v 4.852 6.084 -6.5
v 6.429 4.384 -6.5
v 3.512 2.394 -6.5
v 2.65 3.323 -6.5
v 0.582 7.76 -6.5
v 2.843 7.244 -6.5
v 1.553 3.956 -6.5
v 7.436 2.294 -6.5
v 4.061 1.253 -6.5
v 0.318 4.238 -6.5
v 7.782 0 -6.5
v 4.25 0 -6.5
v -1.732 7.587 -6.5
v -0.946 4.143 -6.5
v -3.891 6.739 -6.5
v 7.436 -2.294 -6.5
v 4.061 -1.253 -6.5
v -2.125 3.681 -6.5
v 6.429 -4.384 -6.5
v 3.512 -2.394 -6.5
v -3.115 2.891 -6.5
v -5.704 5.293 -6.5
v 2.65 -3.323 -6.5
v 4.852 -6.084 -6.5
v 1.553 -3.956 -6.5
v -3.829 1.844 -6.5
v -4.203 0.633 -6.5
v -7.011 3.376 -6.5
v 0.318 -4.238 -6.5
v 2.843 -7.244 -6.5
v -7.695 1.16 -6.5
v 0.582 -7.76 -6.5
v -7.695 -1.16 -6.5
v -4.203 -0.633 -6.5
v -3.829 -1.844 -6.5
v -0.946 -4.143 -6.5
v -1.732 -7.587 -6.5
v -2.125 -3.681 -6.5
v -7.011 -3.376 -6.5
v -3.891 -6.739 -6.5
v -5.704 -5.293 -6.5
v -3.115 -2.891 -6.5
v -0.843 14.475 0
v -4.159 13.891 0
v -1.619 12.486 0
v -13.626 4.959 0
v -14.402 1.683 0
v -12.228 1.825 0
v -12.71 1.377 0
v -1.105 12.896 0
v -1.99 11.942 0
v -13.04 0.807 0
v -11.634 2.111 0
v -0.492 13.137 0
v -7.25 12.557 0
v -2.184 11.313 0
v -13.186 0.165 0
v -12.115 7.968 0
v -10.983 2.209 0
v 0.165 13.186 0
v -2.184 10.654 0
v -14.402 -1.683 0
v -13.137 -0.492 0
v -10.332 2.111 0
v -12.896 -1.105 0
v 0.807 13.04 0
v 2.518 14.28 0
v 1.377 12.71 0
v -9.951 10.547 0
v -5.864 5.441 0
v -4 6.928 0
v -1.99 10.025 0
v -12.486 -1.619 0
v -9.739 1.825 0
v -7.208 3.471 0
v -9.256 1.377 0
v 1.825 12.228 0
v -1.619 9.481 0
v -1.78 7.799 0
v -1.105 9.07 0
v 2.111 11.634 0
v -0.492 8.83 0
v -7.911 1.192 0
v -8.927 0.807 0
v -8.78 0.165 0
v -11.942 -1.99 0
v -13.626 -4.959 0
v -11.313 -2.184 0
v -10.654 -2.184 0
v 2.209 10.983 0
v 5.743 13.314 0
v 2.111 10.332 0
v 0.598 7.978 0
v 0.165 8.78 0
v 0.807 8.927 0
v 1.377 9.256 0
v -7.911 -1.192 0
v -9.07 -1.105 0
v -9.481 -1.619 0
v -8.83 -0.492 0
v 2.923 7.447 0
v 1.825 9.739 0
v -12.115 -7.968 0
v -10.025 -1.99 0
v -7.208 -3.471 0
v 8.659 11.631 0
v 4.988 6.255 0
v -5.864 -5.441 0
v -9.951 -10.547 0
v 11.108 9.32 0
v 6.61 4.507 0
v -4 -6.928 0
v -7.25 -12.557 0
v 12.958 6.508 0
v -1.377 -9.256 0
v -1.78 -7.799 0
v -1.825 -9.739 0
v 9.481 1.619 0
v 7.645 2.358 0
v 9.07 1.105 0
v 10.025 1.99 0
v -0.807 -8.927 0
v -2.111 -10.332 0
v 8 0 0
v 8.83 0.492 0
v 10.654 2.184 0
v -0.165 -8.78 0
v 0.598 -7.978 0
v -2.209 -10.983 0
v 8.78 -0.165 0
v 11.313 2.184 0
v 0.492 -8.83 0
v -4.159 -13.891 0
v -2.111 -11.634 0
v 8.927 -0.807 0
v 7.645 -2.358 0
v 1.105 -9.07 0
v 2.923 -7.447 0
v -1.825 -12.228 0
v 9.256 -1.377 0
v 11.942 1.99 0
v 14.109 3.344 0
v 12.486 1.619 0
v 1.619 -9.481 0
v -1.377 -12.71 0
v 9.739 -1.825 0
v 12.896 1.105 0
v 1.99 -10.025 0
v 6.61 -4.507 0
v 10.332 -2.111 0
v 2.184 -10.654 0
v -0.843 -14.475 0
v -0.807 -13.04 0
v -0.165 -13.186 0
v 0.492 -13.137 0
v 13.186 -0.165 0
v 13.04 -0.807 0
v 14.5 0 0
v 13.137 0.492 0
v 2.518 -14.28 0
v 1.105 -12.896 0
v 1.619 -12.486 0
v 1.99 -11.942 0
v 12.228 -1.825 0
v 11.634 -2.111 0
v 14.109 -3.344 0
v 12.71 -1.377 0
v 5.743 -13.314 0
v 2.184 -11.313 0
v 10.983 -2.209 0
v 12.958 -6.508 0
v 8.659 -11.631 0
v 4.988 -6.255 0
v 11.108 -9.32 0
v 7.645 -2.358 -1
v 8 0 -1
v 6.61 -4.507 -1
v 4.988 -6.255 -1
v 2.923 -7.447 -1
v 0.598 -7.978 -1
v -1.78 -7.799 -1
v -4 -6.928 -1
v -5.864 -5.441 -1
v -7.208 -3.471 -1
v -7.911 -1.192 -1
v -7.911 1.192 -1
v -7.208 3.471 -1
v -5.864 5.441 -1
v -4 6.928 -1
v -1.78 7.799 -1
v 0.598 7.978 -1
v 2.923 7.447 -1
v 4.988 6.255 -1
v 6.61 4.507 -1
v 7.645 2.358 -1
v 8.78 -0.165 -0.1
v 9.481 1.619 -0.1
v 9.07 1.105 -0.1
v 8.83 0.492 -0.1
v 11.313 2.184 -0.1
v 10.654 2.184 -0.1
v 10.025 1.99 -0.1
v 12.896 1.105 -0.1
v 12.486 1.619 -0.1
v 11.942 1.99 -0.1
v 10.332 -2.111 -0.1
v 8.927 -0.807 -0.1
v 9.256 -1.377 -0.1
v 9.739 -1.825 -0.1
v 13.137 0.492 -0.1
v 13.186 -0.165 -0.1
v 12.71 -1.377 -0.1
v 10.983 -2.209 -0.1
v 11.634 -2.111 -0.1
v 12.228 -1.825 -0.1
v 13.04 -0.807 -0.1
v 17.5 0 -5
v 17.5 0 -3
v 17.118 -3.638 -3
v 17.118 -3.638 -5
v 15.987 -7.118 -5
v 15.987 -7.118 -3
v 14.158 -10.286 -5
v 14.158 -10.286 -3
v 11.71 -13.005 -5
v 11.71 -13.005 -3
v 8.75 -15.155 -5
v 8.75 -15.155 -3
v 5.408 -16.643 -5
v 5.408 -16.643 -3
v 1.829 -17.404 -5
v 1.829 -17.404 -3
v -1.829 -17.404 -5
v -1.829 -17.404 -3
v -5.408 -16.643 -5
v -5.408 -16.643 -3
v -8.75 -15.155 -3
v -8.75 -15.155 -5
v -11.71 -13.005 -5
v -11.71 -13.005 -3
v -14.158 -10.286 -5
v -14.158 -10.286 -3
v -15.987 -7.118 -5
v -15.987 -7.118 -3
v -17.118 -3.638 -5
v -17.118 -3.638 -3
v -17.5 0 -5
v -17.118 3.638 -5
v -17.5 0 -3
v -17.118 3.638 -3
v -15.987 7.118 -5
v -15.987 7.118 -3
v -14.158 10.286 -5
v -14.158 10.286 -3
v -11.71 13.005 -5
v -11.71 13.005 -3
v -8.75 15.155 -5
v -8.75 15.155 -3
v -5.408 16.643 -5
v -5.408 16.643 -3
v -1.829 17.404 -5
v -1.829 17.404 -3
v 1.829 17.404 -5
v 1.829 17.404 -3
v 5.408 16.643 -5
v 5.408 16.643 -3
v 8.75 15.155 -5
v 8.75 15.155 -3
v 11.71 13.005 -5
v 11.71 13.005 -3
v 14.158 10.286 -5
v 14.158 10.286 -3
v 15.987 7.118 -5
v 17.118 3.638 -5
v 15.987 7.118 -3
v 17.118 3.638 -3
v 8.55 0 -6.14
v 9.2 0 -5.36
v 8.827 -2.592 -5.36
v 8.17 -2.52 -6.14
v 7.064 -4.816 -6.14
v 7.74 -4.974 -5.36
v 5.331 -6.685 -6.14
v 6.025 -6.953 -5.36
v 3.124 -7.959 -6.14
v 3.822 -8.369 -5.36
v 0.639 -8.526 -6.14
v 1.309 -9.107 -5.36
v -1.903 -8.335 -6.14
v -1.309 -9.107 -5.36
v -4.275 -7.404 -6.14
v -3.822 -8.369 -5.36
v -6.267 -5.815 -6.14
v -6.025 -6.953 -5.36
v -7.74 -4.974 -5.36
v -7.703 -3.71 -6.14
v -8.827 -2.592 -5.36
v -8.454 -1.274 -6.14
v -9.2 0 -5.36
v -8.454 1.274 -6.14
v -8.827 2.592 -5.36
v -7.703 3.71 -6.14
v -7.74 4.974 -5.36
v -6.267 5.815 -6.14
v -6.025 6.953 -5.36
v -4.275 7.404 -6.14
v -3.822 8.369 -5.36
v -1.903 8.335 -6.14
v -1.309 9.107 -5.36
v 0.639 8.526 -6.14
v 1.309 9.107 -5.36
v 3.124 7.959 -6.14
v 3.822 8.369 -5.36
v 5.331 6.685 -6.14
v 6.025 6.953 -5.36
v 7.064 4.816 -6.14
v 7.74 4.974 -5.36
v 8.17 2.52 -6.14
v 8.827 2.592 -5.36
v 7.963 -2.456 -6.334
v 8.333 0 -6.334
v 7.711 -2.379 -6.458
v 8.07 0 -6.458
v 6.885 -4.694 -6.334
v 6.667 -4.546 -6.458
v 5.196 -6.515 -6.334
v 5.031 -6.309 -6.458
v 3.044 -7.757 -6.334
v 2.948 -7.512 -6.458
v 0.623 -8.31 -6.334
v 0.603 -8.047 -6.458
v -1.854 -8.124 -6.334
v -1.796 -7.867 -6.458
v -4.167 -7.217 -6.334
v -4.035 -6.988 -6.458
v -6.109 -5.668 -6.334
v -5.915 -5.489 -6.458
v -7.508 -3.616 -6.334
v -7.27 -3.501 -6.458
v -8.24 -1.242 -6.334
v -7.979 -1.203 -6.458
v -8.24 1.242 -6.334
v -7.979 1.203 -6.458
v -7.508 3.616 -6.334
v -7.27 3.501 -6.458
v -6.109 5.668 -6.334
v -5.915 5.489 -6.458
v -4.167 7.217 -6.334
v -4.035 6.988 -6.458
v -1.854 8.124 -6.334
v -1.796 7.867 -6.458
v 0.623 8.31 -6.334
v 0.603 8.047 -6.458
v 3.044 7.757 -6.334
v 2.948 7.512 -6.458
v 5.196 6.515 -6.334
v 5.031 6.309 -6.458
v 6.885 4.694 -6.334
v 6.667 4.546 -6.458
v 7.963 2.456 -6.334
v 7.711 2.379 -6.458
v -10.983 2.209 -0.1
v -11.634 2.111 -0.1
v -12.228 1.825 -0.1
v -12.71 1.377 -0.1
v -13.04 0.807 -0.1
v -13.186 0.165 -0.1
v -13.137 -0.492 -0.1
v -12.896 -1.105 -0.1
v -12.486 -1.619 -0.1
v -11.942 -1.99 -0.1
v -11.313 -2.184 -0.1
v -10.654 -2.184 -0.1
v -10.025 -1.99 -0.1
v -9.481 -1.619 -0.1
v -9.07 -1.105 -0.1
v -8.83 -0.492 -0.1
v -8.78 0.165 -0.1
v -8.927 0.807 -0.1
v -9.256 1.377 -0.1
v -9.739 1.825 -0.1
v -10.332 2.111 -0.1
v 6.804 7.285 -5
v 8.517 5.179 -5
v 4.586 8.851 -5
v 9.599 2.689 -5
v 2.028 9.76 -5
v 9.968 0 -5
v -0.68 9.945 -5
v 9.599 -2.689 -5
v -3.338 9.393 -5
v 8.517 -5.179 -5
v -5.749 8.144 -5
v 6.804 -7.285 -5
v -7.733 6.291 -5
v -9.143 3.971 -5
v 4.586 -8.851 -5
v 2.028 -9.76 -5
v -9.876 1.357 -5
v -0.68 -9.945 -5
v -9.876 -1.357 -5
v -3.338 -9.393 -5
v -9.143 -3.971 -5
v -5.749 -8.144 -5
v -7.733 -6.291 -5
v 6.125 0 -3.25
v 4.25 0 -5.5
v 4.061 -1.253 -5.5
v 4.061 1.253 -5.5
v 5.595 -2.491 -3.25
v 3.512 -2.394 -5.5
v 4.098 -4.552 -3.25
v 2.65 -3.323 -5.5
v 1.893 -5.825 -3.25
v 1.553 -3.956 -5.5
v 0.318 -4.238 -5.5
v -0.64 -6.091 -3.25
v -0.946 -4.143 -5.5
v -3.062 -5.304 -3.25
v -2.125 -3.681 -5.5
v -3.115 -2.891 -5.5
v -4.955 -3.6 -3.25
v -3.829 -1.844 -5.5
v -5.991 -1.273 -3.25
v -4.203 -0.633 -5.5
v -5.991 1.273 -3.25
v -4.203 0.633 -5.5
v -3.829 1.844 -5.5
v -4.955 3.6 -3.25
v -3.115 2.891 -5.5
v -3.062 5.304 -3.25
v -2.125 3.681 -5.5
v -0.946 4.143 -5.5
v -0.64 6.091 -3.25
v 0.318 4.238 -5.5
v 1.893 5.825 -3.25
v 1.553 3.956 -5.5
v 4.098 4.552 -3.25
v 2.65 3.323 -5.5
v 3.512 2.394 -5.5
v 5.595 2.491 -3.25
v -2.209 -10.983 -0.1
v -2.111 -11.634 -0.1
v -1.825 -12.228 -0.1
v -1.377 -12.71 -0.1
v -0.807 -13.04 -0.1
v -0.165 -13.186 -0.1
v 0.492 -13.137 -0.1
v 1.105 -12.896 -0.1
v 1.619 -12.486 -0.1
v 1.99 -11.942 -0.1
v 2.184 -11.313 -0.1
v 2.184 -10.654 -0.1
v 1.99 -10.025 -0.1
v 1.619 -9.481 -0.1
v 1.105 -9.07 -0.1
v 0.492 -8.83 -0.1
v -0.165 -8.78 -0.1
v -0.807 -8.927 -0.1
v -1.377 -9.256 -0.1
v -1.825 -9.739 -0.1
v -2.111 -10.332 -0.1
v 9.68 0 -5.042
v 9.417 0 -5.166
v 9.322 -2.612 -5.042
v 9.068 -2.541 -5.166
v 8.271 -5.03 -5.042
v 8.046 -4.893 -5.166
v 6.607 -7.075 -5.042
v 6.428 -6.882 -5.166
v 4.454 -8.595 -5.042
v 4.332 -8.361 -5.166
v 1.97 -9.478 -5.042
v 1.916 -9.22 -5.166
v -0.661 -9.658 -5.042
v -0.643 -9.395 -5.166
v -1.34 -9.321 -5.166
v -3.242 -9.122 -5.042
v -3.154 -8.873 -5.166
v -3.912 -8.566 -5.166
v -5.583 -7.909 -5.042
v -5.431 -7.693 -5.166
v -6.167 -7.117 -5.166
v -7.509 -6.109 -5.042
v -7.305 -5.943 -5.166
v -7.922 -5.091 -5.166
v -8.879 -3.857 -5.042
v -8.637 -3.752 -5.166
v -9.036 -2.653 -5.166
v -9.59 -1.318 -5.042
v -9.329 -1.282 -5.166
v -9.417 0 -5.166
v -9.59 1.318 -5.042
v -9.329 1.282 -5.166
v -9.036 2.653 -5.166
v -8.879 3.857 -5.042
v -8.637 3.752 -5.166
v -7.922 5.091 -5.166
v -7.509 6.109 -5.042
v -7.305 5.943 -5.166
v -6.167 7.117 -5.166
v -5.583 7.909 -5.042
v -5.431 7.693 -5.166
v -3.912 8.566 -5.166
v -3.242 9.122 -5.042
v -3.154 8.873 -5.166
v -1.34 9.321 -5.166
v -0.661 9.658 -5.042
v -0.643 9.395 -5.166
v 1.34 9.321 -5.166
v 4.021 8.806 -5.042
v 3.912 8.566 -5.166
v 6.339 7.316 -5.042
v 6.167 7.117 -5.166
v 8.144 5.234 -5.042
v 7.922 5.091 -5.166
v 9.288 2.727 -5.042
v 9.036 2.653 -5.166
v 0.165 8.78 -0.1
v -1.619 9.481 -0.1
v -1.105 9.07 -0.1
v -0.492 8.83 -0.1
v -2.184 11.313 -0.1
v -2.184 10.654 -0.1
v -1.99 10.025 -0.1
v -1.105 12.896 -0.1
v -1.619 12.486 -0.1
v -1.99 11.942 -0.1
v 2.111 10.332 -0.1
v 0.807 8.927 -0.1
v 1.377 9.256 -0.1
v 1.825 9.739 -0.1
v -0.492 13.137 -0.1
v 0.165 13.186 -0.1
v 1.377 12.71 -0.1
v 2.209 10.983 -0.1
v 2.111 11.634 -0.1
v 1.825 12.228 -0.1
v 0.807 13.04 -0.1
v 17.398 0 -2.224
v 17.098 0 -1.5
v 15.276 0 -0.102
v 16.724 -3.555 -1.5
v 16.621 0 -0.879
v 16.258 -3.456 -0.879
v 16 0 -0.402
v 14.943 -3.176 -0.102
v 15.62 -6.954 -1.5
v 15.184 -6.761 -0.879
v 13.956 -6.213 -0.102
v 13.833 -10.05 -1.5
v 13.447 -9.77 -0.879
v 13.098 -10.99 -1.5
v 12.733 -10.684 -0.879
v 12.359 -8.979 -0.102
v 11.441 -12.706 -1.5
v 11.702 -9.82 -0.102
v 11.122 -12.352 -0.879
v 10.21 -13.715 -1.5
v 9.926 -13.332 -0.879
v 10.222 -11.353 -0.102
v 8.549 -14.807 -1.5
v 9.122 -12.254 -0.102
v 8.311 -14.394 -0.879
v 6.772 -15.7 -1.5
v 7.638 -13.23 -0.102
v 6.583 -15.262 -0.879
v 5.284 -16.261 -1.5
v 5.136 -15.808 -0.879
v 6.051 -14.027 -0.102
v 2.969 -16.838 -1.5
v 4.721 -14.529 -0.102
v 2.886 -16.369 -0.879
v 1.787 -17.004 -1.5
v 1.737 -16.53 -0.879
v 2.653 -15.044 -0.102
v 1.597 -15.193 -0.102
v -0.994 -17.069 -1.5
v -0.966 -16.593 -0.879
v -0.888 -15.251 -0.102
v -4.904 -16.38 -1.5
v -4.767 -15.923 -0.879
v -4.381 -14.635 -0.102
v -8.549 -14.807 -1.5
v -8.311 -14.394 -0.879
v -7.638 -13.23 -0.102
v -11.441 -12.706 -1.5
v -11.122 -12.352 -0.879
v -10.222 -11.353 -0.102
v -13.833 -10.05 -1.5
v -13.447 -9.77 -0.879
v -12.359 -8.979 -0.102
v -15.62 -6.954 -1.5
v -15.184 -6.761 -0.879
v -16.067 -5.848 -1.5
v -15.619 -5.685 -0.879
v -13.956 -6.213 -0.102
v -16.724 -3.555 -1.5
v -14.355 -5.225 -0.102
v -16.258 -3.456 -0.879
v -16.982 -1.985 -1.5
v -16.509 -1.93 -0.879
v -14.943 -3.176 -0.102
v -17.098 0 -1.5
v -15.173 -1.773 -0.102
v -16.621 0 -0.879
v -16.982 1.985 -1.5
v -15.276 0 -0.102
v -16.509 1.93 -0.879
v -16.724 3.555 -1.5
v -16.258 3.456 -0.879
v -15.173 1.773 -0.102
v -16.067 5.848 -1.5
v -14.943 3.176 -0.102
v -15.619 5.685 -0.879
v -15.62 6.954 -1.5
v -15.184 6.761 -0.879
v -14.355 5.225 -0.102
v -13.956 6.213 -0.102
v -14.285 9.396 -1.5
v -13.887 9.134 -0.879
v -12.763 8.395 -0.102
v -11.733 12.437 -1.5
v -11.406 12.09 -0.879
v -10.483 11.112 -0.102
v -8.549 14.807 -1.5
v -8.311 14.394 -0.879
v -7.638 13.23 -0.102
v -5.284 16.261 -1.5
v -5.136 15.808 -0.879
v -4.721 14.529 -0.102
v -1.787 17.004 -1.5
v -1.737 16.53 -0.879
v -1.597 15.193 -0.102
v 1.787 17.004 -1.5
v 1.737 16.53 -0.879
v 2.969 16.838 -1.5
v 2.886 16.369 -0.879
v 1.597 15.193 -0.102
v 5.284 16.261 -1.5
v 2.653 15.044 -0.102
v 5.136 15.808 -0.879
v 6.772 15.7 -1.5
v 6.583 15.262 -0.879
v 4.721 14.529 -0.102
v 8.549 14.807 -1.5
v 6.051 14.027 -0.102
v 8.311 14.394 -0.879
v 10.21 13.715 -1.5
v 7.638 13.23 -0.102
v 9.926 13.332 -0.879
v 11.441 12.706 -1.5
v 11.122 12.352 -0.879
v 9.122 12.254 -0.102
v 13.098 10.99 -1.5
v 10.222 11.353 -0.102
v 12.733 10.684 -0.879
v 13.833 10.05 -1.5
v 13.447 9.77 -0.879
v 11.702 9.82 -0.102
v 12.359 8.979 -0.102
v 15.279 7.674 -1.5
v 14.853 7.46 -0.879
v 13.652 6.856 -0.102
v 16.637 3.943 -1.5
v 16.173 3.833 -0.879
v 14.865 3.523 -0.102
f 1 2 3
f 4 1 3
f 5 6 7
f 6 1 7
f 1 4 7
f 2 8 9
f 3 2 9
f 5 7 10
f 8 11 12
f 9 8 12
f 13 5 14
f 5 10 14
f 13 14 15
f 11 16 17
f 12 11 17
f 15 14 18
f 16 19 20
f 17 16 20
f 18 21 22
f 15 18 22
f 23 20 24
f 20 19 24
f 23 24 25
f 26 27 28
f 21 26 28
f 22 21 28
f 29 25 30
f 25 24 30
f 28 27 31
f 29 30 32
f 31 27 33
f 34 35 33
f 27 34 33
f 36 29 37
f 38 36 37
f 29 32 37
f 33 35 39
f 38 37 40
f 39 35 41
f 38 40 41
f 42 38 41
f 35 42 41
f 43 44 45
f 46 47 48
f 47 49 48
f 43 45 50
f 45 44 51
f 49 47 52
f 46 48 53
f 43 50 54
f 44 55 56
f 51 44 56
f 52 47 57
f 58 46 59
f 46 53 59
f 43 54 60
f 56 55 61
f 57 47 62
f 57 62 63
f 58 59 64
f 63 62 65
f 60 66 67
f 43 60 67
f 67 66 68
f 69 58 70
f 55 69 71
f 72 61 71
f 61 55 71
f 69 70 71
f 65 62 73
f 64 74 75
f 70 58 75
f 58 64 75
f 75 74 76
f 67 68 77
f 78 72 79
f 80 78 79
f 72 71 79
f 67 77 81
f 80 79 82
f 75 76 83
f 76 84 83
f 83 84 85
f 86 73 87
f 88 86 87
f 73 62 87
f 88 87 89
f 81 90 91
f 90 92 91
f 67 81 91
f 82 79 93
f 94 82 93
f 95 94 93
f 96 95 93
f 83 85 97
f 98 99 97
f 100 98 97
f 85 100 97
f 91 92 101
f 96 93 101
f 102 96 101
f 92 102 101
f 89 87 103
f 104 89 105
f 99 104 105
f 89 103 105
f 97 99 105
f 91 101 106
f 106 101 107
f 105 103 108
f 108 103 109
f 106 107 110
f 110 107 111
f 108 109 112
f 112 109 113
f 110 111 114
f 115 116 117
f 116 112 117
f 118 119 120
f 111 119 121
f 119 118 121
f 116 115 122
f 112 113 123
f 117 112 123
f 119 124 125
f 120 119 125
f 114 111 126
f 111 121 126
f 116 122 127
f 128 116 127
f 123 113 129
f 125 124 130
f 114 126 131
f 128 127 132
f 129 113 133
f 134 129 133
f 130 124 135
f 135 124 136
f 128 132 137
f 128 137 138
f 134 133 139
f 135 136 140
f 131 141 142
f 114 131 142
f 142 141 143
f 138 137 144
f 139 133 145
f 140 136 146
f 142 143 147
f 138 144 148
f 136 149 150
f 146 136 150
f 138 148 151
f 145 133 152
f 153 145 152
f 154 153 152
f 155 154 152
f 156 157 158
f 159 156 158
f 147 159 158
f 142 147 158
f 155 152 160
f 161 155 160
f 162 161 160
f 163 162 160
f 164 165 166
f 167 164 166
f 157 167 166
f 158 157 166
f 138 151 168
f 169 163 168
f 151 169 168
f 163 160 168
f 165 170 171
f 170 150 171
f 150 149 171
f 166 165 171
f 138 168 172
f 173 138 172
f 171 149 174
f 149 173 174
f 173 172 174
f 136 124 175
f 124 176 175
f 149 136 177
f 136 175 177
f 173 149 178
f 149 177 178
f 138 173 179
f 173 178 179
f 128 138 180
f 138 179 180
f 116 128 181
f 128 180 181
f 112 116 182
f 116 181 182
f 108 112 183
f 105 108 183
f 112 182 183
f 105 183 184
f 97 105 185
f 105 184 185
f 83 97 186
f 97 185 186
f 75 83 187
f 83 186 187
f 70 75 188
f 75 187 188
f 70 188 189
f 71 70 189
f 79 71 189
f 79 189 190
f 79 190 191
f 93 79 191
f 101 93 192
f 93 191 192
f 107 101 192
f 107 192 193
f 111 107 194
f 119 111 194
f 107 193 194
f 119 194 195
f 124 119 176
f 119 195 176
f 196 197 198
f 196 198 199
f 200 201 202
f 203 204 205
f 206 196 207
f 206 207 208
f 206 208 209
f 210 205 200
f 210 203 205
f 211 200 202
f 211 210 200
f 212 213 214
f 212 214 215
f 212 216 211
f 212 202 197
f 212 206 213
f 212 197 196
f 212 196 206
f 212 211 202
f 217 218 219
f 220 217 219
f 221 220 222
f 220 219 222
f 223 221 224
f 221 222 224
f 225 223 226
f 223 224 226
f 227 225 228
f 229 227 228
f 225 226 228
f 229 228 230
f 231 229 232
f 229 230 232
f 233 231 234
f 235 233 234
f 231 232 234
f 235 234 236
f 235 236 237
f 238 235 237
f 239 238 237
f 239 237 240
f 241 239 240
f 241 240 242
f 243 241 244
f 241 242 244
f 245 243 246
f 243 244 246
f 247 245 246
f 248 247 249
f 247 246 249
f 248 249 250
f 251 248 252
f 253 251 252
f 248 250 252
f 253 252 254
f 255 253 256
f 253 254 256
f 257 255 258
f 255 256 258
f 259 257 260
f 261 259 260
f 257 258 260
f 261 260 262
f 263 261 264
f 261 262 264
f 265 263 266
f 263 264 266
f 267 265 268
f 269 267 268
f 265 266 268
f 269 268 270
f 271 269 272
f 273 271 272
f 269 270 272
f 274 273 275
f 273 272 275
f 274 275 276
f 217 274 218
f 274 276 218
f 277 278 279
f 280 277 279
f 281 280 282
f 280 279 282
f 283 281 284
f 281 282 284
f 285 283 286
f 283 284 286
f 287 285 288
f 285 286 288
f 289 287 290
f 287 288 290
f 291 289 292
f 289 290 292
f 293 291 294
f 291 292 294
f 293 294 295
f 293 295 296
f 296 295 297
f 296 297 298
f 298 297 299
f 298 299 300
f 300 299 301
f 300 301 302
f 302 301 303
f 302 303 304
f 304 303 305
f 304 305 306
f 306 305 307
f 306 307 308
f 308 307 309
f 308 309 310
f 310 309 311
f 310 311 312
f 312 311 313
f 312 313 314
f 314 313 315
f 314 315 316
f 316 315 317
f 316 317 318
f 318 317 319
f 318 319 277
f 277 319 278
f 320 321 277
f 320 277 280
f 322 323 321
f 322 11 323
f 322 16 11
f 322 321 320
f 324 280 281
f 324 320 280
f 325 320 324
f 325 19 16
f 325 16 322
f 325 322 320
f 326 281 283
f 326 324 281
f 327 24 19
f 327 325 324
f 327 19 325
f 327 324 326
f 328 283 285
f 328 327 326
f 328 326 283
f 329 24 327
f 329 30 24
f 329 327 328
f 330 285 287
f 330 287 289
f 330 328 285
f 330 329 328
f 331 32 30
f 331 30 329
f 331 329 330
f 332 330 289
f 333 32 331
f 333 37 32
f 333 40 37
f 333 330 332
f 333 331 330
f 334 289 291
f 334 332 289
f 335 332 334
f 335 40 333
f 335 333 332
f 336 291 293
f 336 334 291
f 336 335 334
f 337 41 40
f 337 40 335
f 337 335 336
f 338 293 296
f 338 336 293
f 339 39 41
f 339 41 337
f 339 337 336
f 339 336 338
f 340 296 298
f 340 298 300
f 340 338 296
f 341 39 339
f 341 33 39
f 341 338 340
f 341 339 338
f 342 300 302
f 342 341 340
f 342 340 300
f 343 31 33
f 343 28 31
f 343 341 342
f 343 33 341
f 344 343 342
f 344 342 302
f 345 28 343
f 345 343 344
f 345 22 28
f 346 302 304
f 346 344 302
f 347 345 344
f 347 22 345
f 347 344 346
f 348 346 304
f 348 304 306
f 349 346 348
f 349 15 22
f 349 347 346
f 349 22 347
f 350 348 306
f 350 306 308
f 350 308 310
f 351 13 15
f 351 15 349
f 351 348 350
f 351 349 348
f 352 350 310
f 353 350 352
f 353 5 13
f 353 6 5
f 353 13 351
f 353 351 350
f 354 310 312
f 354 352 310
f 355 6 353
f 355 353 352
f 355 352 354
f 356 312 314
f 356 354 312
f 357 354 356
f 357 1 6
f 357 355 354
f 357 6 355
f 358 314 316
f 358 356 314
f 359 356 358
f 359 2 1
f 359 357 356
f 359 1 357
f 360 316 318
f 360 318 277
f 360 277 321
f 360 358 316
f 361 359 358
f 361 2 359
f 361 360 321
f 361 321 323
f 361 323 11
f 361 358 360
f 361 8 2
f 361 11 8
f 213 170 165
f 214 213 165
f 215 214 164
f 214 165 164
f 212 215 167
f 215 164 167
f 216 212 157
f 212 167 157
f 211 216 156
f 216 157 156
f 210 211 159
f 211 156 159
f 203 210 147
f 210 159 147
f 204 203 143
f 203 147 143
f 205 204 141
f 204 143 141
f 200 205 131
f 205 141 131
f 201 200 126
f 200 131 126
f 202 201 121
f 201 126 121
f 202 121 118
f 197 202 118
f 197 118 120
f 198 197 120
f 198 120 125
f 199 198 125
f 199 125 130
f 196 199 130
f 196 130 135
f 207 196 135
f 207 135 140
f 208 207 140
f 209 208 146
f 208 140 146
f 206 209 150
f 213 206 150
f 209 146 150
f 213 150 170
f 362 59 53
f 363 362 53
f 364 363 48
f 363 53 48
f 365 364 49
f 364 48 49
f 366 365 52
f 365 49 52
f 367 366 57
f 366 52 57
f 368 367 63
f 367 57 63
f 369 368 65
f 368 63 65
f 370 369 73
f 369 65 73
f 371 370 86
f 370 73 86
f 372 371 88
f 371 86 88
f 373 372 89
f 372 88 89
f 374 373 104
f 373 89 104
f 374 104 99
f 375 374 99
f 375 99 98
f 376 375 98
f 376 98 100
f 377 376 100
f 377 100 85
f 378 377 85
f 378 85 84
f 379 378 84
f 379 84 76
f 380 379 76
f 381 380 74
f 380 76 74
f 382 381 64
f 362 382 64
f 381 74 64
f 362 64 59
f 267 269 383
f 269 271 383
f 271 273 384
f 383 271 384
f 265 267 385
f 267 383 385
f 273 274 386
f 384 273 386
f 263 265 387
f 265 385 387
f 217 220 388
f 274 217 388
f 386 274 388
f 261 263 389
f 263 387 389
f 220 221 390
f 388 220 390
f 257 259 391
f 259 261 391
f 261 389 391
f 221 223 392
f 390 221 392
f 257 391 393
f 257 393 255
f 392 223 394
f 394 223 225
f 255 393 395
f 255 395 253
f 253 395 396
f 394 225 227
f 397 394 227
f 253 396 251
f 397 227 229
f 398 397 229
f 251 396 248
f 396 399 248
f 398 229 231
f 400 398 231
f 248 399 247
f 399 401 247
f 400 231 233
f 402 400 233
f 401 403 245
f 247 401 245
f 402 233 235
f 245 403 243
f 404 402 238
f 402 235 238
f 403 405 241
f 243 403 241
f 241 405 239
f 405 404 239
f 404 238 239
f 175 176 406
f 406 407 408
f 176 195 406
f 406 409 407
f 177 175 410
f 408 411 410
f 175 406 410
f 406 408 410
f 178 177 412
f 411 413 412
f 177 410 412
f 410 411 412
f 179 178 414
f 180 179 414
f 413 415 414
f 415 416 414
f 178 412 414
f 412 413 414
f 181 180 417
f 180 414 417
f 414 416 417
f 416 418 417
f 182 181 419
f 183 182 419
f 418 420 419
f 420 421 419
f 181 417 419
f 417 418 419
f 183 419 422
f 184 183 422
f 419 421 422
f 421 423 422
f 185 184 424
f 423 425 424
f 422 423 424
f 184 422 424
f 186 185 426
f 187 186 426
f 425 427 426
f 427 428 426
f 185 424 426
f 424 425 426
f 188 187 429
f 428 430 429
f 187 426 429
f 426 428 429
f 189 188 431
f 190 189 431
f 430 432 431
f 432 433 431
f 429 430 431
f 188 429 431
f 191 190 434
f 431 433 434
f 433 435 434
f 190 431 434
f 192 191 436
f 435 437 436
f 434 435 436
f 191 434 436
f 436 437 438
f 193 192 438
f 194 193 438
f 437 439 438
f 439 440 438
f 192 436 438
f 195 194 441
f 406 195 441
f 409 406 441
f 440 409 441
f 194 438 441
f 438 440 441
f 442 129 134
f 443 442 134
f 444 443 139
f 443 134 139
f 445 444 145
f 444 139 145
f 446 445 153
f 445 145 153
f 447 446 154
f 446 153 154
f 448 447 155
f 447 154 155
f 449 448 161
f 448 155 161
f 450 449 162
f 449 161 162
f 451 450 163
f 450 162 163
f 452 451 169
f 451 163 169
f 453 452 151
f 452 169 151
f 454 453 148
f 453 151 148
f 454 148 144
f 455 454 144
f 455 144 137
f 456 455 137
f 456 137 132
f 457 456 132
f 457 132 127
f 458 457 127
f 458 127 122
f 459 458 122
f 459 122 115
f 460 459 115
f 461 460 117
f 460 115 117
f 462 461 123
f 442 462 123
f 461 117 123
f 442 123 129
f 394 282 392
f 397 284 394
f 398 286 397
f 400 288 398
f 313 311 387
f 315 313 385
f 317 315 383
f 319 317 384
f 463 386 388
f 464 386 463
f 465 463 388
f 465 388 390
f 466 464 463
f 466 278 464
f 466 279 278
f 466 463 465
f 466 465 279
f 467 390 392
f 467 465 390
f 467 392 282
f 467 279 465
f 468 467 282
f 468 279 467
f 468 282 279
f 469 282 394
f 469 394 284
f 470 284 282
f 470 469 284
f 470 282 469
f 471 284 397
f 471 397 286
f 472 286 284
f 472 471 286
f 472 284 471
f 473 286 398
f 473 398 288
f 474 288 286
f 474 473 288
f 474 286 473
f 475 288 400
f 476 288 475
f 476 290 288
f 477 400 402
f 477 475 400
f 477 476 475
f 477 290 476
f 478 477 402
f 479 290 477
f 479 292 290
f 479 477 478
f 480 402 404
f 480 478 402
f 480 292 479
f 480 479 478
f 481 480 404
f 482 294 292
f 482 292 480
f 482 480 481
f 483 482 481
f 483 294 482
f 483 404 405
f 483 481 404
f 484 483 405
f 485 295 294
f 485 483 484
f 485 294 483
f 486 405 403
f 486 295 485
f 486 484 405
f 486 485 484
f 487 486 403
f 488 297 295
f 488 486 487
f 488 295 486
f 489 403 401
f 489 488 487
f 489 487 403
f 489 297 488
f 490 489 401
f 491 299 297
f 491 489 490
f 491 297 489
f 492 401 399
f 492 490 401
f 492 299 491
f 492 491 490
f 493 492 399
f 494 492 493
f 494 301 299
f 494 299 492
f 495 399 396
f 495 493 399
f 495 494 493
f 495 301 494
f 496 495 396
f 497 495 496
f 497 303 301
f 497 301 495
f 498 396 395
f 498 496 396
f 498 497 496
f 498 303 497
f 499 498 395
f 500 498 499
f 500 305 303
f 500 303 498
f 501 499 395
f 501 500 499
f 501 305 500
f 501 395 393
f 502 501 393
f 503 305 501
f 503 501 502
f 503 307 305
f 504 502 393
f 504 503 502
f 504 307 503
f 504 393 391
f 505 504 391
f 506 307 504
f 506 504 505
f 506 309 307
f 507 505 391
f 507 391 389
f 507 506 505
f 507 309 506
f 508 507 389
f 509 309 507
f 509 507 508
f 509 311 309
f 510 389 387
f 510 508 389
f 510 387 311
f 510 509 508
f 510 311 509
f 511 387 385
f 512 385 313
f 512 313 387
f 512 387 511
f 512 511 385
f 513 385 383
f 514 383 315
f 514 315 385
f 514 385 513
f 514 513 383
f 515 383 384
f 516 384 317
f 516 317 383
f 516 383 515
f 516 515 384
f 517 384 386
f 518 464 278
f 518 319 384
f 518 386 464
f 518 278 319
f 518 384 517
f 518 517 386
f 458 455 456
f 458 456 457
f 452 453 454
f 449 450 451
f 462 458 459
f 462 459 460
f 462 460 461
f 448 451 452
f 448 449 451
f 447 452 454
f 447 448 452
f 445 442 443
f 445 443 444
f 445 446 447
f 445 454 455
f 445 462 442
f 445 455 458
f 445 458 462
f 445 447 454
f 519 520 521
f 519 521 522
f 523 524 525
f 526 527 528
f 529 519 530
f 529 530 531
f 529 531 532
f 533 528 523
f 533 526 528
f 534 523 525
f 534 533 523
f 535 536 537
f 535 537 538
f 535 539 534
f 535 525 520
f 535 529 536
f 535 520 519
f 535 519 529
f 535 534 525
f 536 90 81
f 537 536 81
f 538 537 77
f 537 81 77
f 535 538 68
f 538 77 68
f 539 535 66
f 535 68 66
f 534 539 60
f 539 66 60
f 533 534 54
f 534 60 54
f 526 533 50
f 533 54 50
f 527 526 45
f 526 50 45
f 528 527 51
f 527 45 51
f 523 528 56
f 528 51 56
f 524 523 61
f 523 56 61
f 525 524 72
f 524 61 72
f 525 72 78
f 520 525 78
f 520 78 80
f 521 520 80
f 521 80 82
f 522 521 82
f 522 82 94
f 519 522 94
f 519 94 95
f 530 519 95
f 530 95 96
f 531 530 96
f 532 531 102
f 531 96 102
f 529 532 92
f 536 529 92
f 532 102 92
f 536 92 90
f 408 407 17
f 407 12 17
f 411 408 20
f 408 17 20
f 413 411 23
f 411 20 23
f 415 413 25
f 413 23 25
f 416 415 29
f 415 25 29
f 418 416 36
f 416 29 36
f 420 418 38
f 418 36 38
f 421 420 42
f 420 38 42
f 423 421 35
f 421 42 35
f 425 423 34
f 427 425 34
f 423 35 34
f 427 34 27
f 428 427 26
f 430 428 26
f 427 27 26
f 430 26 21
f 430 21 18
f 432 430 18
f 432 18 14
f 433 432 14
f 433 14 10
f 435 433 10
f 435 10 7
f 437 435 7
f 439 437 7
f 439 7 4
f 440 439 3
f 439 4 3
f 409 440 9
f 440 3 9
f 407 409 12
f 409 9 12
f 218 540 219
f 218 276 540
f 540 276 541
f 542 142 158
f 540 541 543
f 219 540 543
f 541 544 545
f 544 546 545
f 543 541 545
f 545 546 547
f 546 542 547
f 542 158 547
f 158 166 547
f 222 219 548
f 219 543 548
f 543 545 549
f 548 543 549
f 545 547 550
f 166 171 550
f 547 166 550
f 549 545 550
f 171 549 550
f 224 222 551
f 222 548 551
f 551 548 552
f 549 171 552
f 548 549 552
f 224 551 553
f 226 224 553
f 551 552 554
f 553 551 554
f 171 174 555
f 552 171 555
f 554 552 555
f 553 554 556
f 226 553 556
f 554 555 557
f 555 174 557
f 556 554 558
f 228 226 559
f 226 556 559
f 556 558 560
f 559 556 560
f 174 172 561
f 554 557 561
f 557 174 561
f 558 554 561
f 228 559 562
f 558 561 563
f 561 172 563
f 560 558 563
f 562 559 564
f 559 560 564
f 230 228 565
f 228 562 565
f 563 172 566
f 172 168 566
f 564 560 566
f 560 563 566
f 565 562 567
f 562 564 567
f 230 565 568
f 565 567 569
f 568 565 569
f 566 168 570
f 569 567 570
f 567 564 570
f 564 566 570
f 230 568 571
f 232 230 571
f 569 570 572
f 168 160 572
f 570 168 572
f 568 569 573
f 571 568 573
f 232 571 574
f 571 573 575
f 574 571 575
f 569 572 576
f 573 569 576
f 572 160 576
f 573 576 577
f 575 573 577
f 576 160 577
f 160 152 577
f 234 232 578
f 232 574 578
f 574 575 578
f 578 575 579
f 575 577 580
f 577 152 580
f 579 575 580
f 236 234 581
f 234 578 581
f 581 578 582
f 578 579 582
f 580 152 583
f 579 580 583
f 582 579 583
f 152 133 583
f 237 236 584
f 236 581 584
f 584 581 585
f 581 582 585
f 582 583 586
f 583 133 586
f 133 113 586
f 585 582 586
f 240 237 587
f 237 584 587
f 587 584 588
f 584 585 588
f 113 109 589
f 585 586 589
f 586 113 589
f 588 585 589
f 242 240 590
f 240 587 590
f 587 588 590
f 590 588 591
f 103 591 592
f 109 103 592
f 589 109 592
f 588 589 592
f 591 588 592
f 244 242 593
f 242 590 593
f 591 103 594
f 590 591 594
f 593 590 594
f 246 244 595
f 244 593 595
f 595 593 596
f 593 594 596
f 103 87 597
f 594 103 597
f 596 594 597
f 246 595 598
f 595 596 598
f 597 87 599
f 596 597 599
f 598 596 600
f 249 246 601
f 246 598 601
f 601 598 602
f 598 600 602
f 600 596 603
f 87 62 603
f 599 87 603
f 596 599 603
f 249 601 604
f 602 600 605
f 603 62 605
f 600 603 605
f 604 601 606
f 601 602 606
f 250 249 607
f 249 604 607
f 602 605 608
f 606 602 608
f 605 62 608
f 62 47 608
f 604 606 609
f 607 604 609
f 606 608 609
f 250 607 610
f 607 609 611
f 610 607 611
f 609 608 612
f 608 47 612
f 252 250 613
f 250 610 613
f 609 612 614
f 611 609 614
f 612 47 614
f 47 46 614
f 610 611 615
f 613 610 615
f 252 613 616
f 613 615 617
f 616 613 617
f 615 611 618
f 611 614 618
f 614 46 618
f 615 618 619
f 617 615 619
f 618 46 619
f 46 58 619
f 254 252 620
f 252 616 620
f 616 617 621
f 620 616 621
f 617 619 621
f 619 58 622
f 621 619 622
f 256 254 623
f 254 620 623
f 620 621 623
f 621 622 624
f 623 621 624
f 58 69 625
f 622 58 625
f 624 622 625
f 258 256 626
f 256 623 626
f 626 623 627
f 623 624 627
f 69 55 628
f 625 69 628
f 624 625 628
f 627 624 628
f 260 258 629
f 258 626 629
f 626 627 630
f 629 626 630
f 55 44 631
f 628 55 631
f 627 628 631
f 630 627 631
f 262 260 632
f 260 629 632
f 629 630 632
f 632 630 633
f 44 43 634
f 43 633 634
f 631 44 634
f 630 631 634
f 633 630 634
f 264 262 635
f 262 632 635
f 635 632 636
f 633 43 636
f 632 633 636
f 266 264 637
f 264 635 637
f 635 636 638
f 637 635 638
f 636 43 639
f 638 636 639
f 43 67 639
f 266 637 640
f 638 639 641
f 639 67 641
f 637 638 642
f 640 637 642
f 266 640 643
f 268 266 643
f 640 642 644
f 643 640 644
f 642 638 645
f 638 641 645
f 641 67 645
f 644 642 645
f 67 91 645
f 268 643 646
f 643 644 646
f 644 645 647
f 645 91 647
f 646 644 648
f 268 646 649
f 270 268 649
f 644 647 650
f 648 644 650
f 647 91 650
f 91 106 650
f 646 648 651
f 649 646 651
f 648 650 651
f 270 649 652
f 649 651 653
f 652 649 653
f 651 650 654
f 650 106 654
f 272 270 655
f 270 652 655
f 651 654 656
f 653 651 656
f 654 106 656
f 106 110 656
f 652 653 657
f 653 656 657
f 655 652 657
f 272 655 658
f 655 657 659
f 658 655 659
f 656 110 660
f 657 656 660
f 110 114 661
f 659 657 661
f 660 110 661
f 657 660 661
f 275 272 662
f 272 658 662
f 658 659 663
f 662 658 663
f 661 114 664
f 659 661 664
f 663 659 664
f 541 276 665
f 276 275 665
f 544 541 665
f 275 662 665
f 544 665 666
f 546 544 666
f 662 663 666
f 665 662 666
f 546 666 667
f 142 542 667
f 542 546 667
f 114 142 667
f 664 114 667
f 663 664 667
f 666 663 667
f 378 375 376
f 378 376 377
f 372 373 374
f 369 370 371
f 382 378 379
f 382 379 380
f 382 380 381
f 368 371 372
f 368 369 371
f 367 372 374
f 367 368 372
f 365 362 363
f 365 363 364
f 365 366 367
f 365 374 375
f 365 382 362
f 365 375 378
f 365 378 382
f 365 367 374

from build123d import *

# Parameters (mm, degrees)
FILETE1_R             = 3
ESBO_O2_R             = 2.209069454
CORTE_EXTRUS_O1_DEPTH = 0.1
PADR_OCIRCULAR1_COUNT = 4
FILETE2_R             = 1


with BuildPart() as part:
    # Esboço1 → Revolução1 (revolve)
    with BuildSketch(Plane(origin=(0, 0, 0), x_dir=(0, 0, -1), z_dir=(1, 0, 0)), mode=Mode.PRIVATE) as revolu_o1_sk:
        Polygon((6.5, 4.25), (6.5, 8.25), (5, 9.5), (5, 17.5), (0, 17.5), (0, 8), (1, 8), (5.5, 4.25), align=None)
    revolve(revolu_o1_sk.sketch.rotate(Axis((0, 0, 0), (0, 0, -1)), 90), axis=Axis((0, 0, 0), (0, 0, -1)))

    # Filete1
    filete1_edges = [part.edges().sort_by_distance(p)[0] for p in [
        (-17.5, 0, 0),
    ]]
    fillet(filete1_edges, radius=FILETE1_R)

    # Esboço2 → Corte-extrusão1 (cut)
    with BuildSketch(Plane.XY):
        with Locations((0, 10.983322756)):
            Circle(ESBO_O2_R)
    corte_extrus_o1 = extrude(amount=-CORTE_EXTRUS_O1_DEPTH, mode=Mode.SUBTRACT)

    # PadrãoCircular1: Corte-extrusão1 ×4 about axis
    padr_ocircular1_axis = Axis((0, 0, 0), (0, 0, 1))
    for i in range(1, PADR_OCIRCULAR1_COUNT):
        add(corte_extrus_o1.rotate(padr_ocircular1_axis, i * 360 / PADR_OCIRCULAR1_COUNT), mode=Mode.SUBTRACT)

    # Filete2
    filete2_edges = [part.edges().sort_by_distance(p)[0] for p in [
        (-9.5, 0, -5),
        (-8.25, 0, -6.5),
    ]]
    fillet(filete2_edges, radius=FILETE2_R)


solid = part.part
